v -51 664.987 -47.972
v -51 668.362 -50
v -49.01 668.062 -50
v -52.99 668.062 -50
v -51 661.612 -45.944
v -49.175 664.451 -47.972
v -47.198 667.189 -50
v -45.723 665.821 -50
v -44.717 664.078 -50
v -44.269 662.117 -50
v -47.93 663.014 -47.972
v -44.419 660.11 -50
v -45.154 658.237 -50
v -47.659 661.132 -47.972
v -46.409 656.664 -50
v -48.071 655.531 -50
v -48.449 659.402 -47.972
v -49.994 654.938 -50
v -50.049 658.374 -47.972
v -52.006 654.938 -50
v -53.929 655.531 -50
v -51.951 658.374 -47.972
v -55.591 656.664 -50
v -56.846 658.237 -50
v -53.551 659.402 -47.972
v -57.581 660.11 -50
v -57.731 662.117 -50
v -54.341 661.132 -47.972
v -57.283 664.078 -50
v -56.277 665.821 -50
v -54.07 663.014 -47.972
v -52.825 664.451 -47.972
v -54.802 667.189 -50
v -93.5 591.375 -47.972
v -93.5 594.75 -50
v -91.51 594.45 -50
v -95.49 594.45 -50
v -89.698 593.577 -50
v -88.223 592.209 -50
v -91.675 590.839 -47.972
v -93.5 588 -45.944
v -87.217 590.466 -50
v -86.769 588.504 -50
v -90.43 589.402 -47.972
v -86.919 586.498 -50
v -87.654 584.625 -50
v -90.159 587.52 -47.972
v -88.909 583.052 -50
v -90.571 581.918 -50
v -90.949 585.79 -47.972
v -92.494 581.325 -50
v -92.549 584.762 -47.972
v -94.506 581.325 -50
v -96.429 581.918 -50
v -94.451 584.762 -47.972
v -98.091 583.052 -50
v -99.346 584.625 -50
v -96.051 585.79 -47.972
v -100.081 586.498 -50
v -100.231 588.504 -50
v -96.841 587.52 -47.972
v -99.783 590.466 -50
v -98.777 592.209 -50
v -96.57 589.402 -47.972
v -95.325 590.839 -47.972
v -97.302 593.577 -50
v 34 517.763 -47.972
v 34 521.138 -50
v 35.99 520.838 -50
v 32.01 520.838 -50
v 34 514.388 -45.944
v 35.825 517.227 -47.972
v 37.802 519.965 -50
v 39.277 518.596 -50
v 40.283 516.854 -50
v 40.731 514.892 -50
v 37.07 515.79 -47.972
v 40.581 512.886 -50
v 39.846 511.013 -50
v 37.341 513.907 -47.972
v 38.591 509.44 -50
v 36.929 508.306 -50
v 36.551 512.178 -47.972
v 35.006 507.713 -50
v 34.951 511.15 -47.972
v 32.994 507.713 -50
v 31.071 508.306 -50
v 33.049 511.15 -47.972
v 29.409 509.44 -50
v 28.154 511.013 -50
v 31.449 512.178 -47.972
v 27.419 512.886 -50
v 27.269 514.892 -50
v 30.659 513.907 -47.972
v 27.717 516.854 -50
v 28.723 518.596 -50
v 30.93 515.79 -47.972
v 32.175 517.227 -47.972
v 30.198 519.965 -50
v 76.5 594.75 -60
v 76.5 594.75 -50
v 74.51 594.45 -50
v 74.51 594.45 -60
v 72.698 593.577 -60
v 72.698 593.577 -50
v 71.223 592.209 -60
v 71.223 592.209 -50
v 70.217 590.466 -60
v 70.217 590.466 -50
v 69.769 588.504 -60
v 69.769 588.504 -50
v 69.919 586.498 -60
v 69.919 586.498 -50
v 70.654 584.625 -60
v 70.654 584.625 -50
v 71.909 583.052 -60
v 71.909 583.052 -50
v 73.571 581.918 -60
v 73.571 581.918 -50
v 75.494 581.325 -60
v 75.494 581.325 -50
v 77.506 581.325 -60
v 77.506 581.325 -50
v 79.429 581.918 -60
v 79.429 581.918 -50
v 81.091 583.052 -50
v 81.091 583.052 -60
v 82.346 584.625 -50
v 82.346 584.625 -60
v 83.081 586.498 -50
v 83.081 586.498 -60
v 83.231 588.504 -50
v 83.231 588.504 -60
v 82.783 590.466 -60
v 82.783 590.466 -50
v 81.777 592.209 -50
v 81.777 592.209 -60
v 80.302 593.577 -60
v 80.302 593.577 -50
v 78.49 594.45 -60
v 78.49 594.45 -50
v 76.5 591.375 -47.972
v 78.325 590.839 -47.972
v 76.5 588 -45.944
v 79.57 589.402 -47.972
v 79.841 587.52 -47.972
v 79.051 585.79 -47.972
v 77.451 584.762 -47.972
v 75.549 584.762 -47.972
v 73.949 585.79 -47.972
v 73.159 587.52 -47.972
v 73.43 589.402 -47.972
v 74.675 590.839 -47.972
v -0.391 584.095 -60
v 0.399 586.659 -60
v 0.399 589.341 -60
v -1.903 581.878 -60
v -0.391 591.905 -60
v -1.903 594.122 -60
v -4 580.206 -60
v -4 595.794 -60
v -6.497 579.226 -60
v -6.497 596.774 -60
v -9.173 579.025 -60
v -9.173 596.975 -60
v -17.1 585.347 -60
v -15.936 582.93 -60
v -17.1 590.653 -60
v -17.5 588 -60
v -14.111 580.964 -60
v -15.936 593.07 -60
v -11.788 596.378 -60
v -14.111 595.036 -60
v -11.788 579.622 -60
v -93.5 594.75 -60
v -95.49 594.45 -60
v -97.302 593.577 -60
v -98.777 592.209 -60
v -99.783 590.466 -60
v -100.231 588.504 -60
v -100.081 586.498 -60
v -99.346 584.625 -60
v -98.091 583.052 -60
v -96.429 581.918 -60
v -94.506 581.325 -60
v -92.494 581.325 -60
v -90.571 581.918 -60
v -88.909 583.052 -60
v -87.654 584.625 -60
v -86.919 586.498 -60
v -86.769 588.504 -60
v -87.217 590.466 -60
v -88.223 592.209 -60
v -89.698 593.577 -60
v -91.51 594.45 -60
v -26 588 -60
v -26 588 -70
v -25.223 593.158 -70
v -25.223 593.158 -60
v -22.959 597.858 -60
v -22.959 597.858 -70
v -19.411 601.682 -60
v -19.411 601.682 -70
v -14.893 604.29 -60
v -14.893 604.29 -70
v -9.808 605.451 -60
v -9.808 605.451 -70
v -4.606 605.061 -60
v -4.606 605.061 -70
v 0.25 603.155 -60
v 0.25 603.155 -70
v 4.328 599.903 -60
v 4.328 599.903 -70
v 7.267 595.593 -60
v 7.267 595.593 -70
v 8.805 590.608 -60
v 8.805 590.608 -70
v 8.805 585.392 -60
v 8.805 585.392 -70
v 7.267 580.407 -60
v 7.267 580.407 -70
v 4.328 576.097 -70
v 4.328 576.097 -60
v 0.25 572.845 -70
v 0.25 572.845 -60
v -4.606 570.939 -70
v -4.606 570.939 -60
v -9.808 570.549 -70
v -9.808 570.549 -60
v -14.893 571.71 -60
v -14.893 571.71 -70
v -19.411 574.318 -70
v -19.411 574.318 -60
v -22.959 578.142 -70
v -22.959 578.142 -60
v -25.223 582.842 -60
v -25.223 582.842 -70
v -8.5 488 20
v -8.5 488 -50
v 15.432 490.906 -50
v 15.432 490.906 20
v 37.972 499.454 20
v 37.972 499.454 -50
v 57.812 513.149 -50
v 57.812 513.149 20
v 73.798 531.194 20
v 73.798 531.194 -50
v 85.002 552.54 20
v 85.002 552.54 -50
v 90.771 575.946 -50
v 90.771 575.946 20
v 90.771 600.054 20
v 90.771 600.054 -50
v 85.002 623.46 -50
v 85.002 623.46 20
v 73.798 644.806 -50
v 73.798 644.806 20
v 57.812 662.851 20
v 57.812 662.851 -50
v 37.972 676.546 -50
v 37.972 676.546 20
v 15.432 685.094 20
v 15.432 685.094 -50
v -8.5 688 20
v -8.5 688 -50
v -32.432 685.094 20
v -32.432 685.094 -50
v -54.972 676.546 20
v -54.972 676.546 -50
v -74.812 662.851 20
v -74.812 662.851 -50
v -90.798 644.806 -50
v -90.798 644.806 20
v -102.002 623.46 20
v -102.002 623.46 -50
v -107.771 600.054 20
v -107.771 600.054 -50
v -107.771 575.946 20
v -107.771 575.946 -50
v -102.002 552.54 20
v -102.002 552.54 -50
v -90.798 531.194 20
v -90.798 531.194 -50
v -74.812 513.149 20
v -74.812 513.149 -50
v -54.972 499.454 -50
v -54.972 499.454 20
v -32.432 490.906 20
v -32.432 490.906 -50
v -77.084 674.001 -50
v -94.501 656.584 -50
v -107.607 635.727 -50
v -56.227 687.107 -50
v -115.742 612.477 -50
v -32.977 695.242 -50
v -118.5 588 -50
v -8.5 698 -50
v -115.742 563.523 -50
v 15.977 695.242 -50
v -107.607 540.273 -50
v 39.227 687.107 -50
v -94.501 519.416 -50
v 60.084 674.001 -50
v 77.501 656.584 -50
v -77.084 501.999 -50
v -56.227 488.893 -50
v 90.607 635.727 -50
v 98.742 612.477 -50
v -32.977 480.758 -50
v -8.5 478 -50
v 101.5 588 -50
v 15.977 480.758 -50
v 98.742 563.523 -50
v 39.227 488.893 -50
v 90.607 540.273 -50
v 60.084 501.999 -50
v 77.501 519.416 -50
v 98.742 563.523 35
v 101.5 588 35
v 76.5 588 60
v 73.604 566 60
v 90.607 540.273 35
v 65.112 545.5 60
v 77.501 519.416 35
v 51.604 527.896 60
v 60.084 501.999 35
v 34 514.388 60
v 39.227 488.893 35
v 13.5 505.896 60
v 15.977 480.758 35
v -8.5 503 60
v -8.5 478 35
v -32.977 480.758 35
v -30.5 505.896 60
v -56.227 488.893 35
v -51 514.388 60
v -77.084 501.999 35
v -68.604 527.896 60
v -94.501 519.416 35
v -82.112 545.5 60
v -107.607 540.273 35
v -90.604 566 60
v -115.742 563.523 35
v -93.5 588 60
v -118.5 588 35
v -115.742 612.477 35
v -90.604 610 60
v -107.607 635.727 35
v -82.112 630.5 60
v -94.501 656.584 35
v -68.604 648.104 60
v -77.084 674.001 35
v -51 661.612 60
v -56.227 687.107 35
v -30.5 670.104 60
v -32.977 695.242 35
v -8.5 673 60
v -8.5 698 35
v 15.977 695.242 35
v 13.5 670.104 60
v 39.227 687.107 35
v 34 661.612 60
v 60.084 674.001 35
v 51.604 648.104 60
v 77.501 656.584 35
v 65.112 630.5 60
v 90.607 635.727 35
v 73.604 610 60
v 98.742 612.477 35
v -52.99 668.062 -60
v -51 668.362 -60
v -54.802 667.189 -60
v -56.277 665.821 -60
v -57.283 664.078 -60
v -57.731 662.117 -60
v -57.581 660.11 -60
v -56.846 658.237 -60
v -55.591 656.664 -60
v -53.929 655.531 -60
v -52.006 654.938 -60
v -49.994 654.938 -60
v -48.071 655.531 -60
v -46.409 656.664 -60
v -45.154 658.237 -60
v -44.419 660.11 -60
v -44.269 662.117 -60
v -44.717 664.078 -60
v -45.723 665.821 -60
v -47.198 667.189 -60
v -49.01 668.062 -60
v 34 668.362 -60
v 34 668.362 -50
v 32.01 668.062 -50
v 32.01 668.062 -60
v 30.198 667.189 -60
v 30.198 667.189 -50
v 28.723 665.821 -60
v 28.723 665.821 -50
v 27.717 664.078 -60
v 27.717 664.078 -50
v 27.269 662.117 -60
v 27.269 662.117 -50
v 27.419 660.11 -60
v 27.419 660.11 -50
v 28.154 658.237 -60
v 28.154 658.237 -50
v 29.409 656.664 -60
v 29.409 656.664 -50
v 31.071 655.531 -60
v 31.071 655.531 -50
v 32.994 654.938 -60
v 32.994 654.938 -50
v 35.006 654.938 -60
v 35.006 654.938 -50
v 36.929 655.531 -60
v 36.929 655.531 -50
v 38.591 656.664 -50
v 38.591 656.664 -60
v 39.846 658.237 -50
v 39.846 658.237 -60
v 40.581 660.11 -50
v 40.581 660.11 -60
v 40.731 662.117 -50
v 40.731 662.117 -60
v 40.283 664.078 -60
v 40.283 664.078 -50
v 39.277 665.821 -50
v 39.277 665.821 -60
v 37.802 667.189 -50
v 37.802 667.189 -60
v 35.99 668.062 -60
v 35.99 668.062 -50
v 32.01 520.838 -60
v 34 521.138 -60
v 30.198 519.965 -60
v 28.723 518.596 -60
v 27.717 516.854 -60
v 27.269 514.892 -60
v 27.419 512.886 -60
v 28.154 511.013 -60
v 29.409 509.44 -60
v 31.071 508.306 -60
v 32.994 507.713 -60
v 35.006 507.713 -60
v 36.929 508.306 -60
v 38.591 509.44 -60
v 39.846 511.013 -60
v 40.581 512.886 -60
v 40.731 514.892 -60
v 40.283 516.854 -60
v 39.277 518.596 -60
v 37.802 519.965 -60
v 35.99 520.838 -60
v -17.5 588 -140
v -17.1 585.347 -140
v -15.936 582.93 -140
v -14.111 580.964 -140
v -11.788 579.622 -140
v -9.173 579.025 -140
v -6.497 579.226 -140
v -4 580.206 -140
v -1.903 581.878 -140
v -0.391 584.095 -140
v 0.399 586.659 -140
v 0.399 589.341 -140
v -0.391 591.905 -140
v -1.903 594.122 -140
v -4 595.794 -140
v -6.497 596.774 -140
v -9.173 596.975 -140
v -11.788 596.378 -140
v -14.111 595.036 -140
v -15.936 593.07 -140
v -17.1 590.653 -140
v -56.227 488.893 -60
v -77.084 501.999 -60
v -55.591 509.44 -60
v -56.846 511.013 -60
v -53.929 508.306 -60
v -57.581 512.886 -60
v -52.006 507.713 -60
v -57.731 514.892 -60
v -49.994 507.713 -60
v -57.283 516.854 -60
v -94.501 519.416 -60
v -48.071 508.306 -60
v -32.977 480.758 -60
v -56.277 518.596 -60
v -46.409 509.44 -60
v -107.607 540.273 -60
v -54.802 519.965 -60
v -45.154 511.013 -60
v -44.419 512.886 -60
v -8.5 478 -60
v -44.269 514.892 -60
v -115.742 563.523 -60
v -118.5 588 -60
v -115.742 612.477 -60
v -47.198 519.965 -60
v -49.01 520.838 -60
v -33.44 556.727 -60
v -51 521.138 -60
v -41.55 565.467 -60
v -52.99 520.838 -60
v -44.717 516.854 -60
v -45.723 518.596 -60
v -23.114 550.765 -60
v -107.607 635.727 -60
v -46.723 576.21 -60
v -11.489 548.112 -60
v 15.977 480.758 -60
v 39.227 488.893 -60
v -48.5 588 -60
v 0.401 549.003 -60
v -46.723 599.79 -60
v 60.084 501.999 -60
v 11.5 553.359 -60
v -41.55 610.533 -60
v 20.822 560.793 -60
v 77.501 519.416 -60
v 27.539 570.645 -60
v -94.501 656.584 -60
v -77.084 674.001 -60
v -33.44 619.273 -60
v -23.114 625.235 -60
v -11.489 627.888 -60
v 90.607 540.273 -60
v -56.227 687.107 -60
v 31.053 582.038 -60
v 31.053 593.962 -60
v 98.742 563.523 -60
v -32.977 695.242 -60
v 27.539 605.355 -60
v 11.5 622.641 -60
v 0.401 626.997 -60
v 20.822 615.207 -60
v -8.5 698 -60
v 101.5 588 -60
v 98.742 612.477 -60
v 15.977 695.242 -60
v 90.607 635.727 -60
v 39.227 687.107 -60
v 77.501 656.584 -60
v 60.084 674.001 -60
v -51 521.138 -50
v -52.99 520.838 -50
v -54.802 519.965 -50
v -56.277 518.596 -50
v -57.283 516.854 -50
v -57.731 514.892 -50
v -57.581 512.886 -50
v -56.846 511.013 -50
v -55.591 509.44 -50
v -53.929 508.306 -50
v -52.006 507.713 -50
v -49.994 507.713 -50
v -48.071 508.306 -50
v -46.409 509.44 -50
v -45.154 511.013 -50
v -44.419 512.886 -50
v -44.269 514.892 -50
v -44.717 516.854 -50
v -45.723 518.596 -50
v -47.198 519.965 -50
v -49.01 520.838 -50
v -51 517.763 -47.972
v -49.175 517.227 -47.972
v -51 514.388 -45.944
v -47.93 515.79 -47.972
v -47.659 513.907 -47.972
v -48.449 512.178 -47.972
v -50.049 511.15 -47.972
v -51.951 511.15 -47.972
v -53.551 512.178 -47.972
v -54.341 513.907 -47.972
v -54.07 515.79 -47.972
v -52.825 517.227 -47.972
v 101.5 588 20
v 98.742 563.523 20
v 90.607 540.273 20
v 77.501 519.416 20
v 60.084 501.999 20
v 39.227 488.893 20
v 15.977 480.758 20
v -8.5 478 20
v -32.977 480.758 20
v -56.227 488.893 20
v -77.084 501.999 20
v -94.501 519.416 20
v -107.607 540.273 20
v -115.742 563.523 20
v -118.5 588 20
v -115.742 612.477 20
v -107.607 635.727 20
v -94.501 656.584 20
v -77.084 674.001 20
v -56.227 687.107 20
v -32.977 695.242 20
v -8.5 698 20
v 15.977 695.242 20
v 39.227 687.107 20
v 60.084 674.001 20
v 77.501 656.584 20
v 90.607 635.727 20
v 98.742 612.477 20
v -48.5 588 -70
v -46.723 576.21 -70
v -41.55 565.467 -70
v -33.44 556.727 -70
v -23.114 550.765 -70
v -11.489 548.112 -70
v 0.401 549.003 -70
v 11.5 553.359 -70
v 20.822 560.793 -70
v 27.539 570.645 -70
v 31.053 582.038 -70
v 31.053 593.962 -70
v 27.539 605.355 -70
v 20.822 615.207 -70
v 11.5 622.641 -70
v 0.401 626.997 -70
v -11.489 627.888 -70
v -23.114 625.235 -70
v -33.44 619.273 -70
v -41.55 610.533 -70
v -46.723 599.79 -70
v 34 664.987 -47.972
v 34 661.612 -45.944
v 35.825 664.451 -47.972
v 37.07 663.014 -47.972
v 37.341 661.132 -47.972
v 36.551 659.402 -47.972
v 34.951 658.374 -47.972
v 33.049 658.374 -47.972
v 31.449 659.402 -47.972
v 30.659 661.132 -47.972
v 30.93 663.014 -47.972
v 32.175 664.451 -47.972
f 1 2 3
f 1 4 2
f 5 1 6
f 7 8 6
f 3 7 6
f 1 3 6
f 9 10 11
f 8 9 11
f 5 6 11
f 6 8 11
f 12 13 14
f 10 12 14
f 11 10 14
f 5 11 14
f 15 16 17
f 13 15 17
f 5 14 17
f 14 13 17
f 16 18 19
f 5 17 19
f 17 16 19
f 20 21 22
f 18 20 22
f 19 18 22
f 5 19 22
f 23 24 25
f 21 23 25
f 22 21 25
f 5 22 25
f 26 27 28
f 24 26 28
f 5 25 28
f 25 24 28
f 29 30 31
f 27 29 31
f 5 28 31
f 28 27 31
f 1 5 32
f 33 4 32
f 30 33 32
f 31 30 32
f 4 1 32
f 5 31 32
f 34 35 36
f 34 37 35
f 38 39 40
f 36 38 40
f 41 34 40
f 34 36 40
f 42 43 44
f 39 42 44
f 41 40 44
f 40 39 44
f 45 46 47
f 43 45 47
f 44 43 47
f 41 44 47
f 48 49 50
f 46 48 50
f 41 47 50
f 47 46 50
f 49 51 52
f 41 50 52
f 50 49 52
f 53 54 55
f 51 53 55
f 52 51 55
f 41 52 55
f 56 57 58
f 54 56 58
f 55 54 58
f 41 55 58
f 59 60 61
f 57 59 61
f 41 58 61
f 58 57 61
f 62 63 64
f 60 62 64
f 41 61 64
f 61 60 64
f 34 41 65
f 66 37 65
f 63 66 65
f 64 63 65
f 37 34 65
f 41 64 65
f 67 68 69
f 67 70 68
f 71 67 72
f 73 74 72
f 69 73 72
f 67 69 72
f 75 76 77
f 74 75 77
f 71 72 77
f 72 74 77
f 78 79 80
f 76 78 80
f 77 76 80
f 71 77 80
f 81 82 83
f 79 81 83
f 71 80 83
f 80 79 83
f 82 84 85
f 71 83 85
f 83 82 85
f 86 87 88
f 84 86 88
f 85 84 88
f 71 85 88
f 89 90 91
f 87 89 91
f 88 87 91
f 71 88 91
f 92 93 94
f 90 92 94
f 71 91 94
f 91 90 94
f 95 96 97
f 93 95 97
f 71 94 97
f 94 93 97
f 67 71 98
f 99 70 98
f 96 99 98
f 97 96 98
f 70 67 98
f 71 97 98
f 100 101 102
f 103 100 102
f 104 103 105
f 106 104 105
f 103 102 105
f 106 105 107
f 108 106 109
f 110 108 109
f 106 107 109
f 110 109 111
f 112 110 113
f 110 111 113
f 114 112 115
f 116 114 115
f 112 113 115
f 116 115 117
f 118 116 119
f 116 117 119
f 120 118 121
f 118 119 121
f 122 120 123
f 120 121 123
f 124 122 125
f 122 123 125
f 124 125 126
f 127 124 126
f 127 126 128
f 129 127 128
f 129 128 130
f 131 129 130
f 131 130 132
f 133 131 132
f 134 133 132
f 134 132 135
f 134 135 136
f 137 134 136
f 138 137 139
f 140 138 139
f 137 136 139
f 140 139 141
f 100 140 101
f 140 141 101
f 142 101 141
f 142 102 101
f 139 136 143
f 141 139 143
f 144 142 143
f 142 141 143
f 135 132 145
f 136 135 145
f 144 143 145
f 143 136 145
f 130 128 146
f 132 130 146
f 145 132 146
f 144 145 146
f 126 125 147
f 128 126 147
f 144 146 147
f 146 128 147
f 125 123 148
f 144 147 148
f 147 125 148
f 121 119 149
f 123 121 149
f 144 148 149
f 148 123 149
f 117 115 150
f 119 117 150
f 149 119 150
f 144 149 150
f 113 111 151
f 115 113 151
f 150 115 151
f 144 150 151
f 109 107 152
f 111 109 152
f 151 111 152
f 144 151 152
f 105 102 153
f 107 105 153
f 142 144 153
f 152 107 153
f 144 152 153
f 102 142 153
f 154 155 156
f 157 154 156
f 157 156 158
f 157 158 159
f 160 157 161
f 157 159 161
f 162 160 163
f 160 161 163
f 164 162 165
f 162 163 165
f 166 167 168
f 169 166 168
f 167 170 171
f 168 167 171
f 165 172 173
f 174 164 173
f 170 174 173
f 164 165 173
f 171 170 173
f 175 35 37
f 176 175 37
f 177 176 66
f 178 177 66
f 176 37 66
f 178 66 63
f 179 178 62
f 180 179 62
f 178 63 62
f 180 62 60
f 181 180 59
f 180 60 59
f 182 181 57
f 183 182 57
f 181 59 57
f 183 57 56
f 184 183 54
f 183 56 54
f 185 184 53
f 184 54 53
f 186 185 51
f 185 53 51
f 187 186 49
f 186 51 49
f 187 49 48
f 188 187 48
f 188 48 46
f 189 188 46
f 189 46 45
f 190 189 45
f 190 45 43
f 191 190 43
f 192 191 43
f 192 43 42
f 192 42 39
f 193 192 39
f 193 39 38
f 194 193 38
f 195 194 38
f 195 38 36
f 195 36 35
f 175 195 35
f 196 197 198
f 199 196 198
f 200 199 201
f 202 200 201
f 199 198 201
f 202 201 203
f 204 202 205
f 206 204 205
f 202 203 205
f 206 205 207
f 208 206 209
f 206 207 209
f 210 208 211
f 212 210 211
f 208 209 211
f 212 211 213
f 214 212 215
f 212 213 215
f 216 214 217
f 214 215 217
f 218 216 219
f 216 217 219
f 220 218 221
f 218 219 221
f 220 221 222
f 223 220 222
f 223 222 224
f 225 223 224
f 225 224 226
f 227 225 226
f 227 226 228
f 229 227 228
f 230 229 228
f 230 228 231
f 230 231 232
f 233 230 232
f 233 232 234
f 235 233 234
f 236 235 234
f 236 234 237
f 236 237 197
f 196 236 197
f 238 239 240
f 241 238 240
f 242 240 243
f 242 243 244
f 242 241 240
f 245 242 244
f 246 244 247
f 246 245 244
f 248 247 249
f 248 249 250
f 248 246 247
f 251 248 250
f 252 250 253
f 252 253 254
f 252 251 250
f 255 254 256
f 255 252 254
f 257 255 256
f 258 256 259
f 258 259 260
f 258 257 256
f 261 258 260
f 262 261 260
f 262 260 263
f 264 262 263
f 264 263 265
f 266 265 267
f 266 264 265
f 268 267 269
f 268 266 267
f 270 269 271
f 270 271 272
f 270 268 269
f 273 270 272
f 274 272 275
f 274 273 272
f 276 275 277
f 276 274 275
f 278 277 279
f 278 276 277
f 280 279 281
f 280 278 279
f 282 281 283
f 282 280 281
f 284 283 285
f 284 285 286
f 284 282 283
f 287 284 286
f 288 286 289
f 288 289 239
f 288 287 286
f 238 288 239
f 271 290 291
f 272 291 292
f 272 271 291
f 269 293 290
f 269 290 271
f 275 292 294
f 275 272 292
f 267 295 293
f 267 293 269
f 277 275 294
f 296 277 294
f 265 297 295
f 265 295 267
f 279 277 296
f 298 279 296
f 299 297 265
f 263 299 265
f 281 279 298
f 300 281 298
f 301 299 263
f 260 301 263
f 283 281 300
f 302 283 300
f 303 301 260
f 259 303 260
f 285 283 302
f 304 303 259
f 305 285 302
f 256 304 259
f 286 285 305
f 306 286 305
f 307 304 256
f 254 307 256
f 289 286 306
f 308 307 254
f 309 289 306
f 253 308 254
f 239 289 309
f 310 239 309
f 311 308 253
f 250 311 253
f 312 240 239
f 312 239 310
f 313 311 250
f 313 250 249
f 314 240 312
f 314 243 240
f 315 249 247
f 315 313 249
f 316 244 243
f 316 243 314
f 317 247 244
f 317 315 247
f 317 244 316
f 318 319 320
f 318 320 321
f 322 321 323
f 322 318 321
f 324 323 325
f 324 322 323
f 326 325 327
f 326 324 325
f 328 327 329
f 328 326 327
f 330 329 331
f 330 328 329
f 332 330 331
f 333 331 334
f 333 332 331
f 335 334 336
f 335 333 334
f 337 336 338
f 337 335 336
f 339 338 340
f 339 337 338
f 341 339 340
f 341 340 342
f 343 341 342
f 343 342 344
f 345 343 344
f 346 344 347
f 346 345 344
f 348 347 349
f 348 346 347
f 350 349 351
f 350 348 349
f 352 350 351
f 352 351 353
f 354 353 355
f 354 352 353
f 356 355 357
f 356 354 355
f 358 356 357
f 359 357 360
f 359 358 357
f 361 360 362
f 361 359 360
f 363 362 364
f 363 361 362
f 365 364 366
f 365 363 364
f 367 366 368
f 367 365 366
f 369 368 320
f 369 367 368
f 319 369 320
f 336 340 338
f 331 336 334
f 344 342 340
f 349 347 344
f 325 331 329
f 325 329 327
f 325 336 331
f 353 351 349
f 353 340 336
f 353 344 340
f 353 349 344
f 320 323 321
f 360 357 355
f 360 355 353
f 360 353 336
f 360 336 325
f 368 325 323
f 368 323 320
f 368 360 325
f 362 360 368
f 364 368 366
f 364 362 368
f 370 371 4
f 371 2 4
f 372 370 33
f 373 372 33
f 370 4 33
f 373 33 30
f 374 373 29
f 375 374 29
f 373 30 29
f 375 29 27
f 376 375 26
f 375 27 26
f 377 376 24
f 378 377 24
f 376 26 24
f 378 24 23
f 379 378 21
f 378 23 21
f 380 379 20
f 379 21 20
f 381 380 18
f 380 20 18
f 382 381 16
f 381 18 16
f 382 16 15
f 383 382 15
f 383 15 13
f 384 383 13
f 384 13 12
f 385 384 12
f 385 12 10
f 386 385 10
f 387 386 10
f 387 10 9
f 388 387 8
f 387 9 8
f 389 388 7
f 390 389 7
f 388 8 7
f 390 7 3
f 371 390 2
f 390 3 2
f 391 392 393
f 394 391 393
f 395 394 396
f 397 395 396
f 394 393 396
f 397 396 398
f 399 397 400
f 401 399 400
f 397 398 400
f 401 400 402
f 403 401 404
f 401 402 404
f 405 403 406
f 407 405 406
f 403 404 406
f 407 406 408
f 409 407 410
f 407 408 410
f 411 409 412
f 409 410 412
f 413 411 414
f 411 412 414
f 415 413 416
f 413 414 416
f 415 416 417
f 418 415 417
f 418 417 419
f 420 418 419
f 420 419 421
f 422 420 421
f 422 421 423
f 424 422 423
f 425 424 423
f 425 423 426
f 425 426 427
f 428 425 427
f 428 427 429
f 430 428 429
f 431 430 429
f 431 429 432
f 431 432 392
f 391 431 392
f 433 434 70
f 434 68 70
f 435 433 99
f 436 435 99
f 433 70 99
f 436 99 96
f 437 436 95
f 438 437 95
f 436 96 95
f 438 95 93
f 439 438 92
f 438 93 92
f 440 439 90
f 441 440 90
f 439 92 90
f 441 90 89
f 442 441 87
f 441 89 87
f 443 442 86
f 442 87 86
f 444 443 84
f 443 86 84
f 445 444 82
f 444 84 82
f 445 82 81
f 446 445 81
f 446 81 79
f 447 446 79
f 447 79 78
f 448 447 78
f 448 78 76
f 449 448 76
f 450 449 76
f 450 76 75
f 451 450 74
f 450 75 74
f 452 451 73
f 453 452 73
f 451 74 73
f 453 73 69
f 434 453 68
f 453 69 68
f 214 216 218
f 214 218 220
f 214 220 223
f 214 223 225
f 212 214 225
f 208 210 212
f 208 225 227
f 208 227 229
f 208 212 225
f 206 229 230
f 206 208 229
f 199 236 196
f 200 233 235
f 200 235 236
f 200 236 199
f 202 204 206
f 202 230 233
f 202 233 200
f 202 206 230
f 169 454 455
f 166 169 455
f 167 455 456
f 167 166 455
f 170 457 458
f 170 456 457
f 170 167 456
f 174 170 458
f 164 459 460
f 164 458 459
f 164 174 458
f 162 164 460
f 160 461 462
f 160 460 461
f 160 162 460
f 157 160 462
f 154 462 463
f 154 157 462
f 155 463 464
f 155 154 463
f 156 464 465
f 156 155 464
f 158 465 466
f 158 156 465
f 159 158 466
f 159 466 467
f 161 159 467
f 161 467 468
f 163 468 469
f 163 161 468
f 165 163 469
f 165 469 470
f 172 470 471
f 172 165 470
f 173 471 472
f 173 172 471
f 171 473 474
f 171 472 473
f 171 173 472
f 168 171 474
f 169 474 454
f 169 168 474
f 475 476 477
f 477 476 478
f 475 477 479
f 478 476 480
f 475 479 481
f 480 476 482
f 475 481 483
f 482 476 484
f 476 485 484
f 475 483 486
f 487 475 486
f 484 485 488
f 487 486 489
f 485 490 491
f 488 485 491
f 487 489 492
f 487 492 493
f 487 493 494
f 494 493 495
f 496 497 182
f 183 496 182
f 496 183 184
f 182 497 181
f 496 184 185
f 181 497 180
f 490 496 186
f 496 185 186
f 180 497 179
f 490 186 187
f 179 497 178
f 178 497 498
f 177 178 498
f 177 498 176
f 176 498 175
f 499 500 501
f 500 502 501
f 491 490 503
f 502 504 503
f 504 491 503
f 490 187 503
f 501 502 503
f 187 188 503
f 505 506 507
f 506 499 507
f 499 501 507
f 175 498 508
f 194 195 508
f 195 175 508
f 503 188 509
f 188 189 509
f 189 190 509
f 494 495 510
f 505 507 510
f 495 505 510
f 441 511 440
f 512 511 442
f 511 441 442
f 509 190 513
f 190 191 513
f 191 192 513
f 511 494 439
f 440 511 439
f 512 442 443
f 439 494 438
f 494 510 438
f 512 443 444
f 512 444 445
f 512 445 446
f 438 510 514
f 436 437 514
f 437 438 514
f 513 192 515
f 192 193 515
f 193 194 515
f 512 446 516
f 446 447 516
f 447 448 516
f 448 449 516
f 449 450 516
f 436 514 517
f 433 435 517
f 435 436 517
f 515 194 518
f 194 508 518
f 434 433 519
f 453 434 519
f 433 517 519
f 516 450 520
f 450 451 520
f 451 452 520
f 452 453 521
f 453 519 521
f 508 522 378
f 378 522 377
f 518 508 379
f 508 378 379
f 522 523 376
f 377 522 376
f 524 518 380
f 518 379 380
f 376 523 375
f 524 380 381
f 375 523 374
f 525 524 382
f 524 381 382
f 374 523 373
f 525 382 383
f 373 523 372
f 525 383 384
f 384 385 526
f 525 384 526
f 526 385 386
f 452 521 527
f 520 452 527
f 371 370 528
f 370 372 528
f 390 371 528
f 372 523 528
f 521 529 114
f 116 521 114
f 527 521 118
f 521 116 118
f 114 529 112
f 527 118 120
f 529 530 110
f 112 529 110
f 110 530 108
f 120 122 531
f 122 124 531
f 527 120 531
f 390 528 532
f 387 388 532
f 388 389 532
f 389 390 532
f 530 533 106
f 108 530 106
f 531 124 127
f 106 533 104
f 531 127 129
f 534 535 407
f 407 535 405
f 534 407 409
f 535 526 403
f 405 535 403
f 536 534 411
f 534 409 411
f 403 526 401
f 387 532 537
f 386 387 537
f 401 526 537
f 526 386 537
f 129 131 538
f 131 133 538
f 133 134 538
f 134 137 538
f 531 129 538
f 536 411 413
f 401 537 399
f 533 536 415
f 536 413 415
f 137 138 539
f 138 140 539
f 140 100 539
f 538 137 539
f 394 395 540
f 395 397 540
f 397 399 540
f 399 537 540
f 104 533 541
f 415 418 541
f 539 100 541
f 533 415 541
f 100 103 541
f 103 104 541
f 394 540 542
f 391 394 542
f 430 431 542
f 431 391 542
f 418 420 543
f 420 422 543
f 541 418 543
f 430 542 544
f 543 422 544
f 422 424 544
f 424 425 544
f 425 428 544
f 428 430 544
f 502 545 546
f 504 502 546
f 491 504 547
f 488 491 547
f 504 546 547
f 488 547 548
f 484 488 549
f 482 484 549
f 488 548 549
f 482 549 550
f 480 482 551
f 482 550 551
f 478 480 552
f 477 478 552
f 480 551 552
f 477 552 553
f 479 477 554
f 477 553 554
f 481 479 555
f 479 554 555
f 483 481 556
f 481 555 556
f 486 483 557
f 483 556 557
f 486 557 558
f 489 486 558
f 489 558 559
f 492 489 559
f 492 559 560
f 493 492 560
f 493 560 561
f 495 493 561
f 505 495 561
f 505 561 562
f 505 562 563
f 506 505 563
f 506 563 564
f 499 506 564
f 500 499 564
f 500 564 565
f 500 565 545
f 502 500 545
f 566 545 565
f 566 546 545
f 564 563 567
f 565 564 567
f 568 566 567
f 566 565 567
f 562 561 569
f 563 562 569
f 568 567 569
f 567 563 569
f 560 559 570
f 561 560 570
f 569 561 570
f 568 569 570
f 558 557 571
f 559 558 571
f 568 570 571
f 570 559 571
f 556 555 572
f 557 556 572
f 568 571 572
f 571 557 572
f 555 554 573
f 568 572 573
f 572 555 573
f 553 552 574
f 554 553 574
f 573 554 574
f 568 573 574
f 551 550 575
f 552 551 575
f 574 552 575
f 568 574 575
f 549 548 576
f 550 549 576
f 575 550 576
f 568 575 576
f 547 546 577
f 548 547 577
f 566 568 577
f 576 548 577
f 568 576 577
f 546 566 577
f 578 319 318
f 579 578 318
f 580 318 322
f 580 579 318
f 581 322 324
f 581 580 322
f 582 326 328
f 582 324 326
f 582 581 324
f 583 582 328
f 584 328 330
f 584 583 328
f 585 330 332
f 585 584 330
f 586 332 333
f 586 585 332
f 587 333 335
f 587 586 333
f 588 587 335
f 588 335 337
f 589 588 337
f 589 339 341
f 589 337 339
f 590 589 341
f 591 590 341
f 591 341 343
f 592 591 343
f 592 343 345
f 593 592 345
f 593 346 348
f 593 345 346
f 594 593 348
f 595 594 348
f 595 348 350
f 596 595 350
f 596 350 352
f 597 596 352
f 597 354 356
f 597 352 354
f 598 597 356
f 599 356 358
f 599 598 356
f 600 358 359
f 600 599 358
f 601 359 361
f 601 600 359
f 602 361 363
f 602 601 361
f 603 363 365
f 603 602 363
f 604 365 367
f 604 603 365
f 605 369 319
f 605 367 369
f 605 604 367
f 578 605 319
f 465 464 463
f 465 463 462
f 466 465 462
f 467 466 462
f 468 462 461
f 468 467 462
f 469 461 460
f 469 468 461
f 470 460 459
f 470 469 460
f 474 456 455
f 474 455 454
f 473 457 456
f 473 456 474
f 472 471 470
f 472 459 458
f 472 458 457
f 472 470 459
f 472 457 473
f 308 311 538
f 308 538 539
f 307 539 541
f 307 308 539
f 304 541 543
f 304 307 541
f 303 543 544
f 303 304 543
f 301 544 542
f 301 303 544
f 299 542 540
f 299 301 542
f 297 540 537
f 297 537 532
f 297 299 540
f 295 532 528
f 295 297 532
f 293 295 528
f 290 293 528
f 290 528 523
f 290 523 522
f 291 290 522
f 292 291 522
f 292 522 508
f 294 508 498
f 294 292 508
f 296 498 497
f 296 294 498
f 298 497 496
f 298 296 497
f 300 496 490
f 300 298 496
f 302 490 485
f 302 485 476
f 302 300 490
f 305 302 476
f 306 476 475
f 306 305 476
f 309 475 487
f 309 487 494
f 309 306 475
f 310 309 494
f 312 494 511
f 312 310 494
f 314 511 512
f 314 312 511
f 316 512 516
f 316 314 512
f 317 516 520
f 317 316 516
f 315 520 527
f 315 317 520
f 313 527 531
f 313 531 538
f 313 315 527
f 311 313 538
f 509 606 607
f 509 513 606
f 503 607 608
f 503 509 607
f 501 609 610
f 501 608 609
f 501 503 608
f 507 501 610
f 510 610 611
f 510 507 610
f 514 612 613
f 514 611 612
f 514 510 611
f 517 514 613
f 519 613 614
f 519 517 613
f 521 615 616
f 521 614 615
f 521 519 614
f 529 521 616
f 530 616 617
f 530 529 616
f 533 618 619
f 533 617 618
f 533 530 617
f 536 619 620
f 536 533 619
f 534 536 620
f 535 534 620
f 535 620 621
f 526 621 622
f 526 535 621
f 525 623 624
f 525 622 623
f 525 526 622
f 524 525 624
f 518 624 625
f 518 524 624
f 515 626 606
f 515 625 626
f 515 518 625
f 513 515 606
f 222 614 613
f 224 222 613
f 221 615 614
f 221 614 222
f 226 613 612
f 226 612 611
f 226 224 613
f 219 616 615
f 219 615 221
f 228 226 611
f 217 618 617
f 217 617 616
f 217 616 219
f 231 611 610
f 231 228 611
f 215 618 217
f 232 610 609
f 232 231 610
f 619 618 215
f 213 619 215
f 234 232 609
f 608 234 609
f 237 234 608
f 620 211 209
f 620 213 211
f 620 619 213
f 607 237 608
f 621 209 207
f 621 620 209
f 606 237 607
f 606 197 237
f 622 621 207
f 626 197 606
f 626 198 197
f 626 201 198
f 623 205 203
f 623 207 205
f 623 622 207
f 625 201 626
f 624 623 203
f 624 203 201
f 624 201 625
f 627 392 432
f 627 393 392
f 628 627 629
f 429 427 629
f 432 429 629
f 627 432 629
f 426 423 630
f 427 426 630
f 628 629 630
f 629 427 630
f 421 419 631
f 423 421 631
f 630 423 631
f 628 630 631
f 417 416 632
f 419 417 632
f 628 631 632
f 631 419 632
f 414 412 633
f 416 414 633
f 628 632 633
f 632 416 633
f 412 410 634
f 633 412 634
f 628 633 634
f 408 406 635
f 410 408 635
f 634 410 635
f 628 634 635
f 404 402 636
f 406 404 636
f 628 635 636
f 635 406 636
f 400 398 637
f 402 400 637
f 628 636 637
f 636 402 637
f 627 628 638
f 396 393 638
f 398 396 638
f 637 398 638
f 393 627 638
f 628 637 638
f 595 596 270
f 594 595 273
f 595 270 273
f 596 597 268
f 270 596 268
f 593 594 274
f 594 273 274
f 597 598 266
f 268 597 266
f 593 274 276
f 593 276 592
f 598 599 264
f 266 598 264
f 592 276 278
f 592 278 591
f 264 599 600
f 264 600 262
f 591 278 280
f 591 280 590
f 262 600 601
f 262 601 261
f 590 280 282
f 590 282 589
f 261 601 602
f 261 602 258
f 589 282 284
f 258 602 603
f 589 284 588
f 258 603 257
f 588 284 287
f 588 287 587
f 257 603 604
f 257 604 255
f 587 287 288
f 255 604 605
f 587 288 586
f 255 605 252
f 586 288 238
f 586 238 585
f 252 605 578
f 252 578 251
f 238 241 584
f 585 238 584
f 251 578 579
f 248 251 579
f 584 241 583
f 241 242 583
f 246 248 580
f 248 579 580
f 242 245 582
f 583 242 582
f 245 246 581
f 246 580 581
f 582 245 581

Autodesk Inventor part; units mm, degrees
ref_plane "XZ Plane" through (0, 0, 0) normal (0, 1, 0) x (-1, 0, 0)
ref_plane "XY Plane" through (0, 0, 0) normal (0, 0, 1) x (1, 0, 0)
sketch "Sketch1" plane through (0, 0, 0) normal (0, 0, 1) x (1, 0, 0)
  circle A0 centre (-8.5, 588) radius 110
  line L0 (97.5, 88) -> (-202.5, 88) projected
  line L1 (-508.5, 482) -> (-508.5, 782) projected
  line L2 (-114.5, 1088) -> (185.5, 1088) projected
  point P0 (0, 0)
  dimension "d0" = 220
  dimension "d1" = 500
  dimension "d2" = 500
extrude "Extrusion1" add sketch "Sketch1" along normal mid plane 120
ref_plane "Work Plane1" through (-8.5, 588, 0) normal (1, 0, 0) x (0, 0, 1)
sketch "Sketch3" plane through (-8.5, 588, 0) normal (1, 0, 0) x (0, 0, 1)
  line L0 (60, -110) -> (60, 110) projected
  line L1 (-60, 110) -> (-60, -110) projected
  line L2 (-60, 110) -> (60, 110) projected
  line L3 (20, 110) -> (-50, 110)
  line L4 (-50, 110) -> (-50, 100)
  line L5 (-50, 100) -> (20, 100)
  line L6 (20, 100) -> (20, 110)
  line L7 (60, 0) -> (-58.6511, 0)
  line L8 (-84, 0) -> (84, 0) projected
  point P0 (0, 588)
  dimension "d9" = 10
  dimension "d10" = 10
  dimension "d11" = 70
revolve "Revolution1" cut sketch "Sketch3" angle 360 about axis through (-8.5, 588, 0) along (0, 0, 1) contours L6 L5 L4 L2
chamfer "Chamfer1" distance 25 angle 45 1 edges at (-118.5, 588, 60)
sketch "Sketch4" plane through (-8.5, 588, -60) normal (0, 0, -1) x (-1, 0, 0)
  circle A0 centre (0, 0) radius 100 construction
  circle A1 centre (0, 0) radius 85 construction
  point P0 (-8.5, -588)
  point P1 (-85, 0)
  point P2 (-42.5, -73.6122)
  point P3 (42.5, -73.6122)
  point P4 (85, 0)
  point P5 (42.5, 73.6122)
  point P6 (-42.5, 73.6122)
  dimension "d18" = 360
hole "Hole1" at (76.5, 588, -60) at (34, 514.3878, -60) at (-51, 514.3878, -60) at (-93.5, 588, -60) at (-51, 661.6122, -60) at (34, 661.6122, -60) direction (0, 0, 1) diameter 13.5 depth 10 tip angle 118 clearance for "Hex Head Cap Screw ISO 24017" size "M12" standard "ISO"
sketch "Sketch5" plane through (-8.5, 588, -60) normal (0, 0, -1) x (-1, 0, 0)
  circle A0 centre (-42.5, 73.6122) radius 6.75 projected
  circle A1 centre (42.5, 73.6122) radius 6.75 projected
  circle A2 centre (85, 0) radius 6.75 projected
  circle A3 centre (42.5, -73.6122) radius 6.75 projected
  circle A4 centre (-42.5, -73.6122) radius 6.75 projected
  circle A5 centre (-85, 0) radius 6.75 projected
  circle A6 centre (0, 0) radius 110 projected
  circle A7 centre (0, 0) radius 40
  point P0 (-8.5, -588)
  dimension "d27" = 80
extrude "Extrusion2" add sketch "Sketch5" along normal blind 10 contours A7
sketch "Sketch6" plane through (-8.5, 588, -70) normal (0, 0, -1) x (-1, 0, 0)
  circle A0 centre (0, 0) radius 17.5
  point P0 (-8.5, -588)
  dimension "d30" = 35
extrude "Extrusion3" cut sketch "Sketch6" against normal up to surface (10 mm away)
sketch "Sketch7" plane through (-8.5, 588, -60) normal (0, 0, -1) x (-1, 0, 0)
  circle A0 centre (0, 0) radius 17.5 projected
  circle A1 centre (0, 0) radius 9
  point P0 (-8.5, -588)
  dimension "d33" = 18
extrude "Extrusion4" add sketch "Sketch7" along normal blind 80 separate body contours A1
equation "\"d2\" = d1"
properties part number "Motor"
